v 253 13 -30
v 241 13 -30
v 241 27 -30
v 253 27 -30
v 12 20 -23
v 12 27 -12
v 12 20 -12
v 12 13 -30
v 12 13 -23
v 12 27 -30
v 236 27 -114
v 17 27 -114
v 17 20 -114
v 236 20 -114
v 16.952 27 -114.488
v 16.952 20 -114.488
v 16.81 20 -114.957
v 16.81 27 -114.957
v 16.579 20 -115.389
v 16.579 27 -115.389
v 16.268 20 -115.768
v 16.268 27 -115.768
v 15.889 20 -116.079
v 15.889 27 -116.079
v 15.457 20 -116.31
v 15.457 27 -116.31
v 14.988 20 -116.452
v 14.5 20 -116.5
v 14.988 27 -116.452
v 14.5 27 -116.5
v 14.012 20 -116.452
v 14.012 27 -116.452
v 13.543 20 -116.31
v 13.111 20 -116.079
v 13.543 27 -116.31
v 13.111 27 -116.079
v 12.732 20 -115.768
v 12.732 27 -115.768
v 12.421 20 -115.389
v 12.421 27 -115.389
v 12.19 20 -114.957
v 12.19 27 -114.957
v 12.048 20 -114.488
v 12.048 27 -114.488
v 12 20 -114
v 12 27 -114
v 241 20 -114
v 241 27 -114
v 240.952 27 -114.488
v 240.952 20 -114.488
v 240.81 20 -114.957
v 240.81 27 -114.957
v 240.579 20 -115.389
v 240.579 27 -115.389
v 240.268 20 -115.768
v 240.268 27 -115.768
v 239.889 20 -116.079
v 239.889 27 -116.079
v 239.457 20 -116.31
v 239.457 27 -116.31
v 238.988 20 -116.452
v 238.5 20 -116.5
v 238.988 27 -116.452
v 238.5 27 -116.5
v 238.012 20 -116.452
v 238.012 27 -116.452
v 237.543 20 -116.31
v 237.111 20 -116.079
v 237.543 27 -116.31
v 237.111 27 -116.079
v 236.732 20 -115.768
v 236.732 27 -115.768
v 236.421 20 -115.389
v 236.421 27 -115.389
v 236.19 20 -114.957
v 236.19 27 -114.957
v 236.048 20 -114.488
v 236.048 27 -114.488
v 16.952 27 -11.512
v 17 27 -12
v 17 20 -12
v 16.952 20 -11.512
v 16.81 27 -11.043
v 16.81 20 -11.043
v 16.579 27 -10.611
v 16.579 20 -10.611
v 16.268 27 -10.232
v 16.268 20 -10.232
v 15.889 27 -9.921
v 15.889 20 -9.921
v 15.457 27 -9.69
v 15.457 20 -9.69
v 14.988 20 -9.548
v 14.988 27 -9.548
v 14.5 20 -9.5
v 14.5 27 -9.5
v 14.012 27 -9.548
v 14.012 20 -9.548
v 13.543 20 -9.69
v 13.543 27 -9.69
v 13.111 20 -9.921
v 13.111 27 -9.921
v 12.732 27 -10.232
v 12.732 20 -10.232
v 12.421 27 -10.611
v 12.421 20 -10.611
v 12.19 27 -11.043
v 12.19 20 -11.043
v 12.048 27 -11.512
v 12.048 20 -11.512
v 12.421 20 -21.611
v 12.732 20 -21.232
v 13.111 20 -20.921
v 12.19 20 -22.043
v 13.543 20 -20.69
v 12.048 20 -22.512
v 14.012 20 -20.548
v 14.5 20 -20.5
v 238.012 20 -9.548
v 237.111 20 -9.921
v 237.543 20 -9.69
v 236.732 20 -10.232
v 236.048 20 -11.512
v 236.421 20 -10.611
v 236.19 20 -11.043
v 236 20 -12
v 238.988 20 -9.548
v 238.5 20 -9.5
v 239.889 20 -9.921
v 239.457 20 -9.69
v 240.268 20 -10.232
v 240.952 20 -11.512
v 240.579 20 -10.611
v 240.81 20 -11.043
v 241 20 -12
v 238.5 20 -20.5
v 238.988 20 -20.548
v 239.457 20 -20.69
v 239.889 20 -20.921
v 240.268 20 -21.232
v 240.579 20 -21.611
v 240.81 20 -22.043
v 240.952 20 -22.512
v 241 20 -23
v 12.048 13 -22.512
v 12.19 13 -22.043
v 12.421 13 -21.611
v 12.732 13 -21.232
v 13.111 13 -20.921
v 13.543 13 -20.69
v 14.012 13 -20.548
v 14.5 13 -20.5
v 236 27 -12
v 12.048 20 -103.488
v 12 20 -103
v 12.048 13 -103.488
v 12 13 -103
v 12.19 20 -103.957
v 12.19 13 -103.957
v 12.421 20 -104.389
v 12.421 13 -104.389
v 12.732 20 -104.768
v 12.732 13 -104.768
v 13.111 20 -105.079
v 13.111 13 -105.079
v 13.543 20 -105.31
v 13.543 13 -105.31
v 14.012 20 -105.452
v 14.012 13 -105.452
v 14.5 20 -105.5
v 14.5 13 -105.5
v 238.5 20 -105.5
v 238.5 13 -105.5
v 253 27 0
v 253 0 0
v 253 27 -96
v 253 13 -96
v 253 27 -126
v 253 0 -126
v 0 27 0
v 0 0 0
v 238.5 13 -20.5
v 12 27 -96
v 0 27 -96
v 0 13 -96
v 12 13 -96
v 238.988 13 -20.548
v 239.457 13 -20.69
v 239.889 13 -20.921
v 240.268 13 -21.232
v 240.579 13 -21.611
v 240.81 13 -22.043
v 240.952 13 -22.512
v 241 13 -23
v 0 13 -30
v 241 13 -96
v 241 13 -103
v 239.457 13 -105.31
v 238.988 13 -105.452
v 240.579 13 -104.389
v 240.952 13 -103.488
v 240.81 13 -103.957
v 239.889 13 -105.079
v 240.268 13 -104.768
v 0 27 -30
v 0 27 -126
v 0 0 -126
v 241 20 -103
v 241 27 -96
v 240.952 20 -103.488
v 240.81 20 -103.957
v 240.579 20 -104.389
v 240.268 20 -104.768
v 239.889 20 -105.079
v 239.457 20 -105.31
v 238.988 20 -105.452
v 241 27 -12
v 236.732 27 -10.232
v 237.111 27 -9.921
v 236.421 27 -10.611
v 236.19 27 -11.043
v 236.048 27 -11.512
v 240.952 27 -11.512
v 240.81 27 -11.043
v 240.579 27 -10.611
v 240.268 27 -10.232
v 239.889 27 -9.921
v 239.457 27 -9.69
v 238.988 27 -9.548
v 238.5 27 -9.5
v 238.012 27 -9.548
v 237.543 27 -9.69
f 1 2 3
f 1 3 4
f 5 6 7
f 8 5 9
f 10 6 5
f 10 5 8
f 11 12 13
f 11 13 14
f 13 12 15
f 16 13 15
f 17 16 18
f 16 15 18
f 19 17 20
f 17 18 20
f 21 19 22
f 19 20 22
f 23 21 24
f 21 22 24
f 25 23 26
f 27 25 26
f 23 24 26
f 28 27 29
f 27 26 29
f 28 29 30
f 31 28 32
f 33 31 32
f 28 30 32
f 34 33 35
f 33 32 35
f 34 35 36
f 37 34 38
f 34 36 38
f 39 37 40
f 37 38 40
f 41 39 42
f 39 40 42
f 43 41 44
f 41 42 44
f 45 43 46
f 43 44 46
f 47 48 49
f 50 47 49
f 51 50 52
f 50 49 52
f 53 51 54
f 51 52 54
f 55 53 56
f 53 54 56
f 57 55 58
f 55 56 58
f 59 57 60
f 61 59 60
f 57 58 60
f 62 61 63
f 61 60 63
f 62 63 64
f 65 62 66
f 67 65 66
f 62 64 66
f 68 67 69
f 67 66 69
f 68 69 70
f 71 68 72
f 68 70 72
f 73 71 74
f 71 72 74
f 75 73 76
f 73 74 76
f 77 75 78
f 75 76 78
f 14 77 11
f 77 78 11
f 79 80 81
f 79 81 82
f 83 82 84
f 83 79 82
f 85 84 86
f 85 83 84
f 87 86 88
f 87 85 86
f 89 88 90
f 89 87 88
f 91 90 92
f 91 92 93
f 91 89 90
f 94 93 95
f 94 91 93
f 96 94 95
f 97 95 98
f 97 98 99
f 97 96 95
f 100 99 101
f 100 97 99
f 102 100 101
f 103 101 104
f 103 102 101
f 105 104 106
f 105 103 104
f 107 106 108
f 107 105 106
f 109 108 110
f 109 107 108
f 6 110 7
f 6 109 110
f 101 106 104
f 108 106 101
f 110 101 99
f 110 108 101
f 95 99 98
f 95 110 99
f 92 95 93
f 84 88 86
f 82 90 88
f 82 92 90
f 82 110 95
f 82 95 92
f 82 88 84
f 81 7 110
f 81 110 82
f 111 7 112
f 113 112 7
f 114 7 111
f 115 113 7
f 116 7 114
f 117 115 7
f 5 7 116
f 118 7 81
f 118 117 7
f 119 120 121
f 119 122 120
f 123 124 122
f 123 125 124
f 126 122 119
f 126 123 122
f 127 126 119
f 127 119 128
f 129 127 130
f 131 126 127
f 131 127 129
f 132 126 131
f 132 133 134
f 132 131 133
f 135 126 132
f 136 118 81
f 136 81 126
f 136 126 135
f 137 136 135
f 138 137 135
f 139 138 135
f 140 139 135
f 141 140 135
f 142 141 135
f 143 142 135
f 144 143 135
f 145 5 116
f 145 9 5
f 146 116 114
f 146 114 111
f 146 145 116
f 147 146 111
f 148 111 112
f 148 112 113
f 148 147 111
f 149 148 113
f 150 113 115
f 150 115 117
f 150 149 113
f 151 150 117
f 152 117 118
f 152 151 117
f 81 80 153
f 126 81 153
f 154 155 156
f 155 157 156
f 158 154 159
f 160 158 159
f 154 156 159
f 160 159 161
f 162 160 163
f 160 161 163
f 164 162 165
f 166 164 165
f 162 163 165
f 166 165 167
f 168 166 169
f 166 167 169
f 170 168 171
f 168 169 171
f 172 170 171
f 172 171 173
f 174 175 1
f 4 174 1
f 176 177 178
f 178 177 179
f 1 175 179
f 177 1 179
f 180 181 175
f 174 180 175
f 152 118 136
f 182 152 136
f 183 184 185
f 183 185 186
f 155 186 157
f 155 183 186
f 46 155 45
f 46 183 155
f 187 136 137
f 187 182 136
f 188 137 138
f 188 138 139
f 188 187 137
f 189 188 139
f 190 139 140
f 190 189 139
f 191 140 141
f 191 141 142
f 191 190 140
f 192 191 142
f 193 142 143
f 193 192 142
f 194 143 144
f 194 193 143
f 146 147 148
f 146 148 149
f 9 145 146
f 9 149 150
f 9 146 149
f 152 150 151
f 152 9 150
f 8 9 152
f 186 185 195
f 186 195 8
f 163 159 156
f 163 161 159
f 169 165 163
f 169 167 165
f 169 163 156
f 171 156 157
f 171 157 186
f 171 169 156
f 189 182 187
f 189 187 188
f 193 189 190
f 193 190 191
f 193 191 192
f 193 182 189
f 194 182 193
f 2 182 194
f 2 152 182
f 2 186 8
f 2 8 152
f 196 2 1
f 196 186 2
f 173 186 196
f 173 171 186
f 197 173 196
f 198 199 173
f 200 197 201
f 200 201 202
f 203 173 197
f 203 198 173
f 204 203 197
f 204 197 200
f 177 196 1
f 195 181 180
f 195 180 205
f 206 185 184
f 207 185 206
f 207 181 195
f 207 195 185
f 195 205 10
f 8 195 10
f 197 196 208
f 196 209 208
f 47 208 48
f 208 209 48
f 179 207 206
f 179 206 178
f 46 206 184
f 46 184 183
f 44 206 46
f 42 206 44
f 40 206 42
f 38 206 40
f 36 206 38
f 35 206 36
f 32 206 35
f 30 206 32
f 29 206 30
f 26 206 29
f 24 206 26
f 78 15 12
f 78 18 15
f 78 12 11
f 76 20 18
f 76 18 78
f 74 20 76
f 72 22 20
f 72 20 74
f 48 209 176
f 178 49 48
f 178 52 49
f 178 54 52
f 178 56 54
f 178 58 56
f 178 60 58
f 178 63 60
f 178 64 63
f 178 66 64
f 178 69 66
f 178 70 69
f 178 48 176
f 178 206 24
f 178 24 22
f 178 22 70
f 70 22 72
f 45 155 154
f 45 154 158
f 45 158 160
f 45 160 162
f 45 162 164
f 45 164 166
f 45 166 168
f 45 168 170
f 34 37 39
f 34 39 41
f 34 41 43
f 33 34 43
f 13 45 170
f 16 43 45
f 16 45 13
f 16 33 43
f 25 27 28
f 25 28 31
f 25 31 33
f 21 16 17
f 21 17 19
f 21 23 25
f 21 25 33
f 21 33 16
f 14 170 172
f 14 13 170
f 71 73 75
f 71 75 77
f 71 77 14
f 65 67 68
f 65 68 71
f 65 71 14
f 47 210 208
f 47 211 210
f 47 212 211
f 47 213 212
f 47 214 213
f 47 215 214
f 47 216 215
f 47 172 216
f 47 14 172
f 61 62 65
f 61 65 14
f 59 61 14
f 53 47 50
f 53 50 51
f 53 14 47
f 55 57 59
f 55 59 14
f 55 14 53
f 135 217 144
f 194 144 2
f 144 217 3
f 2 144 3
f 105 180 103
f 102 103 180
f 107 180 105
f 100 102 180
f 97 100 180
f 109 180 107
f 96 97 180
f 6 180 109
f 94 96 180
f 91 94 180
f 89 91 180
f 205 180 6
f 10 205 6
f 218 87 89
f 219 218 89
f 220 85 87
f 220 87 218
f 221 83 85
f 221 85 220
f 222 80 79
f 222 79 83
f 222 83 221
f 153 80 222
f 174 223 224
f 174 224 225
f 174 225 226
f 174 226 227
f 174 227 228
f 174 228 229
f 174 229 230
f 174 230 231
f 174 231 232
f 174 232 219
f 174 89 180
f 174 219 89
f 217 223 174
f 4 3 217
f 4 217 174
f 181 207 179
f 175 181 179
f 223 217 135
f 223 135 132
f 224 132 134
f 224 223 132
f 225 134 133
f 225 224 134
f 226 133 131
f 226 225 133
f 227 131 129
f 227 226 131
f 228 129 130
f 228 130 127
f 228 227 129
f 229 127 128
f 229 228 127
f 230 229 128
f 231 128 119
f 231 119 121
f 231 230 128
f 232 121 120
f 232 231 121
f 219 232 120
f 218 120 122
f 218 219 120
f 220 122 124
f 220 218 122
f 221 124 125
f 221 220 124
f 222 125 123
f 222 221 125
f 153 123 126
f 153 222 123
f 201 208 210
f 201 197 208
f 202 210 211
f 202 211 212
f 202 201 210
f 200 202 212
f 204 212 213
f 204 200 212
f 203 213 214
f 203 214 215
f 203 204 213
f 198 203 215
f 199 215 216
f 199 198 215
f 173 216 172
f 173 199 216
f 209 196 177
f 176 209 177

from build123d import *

# Parameters (mm, degrees)
SKETCH1_W           = 253
SKETCH1_H           = 126
BOSS_EXTRUDE1_DEPTH = 27
SKETCH2_W           = 229
SKETCH2_H           = 102
CUT_EXTRUDE1_DEPTH  = 7
SKETCH3_W           = 229
SKETCH3_H           = 85
CUT_EXTRUDE2_DEPTH  = 7
SKETCH4_W           = 12
SKETCH4_H           = 66
CUT_EXTRUDE3_DEPTH  = 14
SKETCH5_W           = 12
SKETCH5_H           = 66
CUT_EXTRUDE4_DEPTH  = 14
CUT_EXTRUDE5_DEPTH  = 7
FILLET1_R           = 2.5


with BuildPart() as part:
    # Sketch1 → Boss-Extrude1 (new body)
    with BuildSketch(Plane(origin=(0, 0, 0), x_dir=(1, 0, 0), z_dir=(0, 1, 0))):
        with Locations((126.5, 63)):
            Rectangle(SKETCH1_W, SKETCH1_H)
    extrude(amount=BOSS_EXTRUDE1_DEPTH)

    # Sketch2 → Cut-Extrude1 (cut)
    with BuildSketch(Plane(origin=(0, 27, 0), x_dir=(1, 0, 0), z_dir=(0, 1, 0))):
        with Locations((126.5, 63)):
            Rectangle(SKETCH2_W, SKETCH2_H)
    extrude(amount=-CUT_EXTRUDE1_DEPTH, mode=Mode.SUBTRACT)

    # Sketch3 → Cut-Extrude2 (cut)
    with BuildSketch(Plane(origin=(0, 20, 0), x_dir=(1, 0, 0), z_dir=(0, 1, 0))):
        with Locations((126.5, 63)):
            Rectangle(SKETCH3_W, SKETCH3_H)
    extrude(amount=-CUT_EXTRUDE2_DEPTH, mode=Mode.SUBTRACT)

    # Sketch4 → Cut-Extrude3 (cut)
    with BuildSketch(Plane(origin=(0, 27, 0), x_dir=(1, 0, 0), z_dir=(0, 1, 0))):
        with Locations((6, 63)):
            Rectangle(SKETCH4_W, SKETCH4_H)
    extrude(amount=-CUT_EXTRUDE3_DEPTH, mode=Mode.SUBTRACT)

    # Sketch5 → Cut-Extrude4 (cut)
    with BuildSketch(Plane(origin=(0, 27, 0), x_dir=(1, 0, 0), z_dir=(0, 1, 0))):
        with Locations((247, 63)):
            Rectangle(SKETCH5_W, SKETCH5_H)
    extrude(amount=-CUT_EXTRUDE4_DEPTH, mode=Mode.SUBTRACT)

    # Sketch6 → Cut-Extrude5 (cut)
    with BuildSketch(Plane(origin=(0, 27, 0), x_dir=(1, 0, 0), z_dir=(0, 1, 0))):
        with BuildLine():
            Line((12, 12), (17, 12))
            ThreePointArc((17, 12), (14.5, 9.5), (12, 12))
        make_face()
        with BuildLine():
            Line((236, 12), (241, 12))
            ThreePointArc((241, 12), (238.5, 9.5), (236, 12))
        make_face()
        with BuildLine():
            Line((12, 114), (17, 114))
            ThreePointArc((17, 114), (14.5, 116.5), (12, 114))
        make_face()
        with BuildLine():
            Line((236, 114), (241, 114))
            ThreePointArc((241, 114), (238.5, 116.5), (236, 114))
        make_face()
    extrude(amount=-CUT_EXTRUDE5_DEPTH, mode=Mode.SUBTRACT)

    # Fillet1
    fillet1_edges = [part.edges().sort_by_distance(p)[0] for p in [
        (241, 16.5, -105.5),
        (241, 16.5, -20.5),
        (12, 16.5, -20.5),
        (12, 16.5, -105.5),
    ]]
    fillet(fillet1_edges, radius=FILLET1_R)


solid = part.part
